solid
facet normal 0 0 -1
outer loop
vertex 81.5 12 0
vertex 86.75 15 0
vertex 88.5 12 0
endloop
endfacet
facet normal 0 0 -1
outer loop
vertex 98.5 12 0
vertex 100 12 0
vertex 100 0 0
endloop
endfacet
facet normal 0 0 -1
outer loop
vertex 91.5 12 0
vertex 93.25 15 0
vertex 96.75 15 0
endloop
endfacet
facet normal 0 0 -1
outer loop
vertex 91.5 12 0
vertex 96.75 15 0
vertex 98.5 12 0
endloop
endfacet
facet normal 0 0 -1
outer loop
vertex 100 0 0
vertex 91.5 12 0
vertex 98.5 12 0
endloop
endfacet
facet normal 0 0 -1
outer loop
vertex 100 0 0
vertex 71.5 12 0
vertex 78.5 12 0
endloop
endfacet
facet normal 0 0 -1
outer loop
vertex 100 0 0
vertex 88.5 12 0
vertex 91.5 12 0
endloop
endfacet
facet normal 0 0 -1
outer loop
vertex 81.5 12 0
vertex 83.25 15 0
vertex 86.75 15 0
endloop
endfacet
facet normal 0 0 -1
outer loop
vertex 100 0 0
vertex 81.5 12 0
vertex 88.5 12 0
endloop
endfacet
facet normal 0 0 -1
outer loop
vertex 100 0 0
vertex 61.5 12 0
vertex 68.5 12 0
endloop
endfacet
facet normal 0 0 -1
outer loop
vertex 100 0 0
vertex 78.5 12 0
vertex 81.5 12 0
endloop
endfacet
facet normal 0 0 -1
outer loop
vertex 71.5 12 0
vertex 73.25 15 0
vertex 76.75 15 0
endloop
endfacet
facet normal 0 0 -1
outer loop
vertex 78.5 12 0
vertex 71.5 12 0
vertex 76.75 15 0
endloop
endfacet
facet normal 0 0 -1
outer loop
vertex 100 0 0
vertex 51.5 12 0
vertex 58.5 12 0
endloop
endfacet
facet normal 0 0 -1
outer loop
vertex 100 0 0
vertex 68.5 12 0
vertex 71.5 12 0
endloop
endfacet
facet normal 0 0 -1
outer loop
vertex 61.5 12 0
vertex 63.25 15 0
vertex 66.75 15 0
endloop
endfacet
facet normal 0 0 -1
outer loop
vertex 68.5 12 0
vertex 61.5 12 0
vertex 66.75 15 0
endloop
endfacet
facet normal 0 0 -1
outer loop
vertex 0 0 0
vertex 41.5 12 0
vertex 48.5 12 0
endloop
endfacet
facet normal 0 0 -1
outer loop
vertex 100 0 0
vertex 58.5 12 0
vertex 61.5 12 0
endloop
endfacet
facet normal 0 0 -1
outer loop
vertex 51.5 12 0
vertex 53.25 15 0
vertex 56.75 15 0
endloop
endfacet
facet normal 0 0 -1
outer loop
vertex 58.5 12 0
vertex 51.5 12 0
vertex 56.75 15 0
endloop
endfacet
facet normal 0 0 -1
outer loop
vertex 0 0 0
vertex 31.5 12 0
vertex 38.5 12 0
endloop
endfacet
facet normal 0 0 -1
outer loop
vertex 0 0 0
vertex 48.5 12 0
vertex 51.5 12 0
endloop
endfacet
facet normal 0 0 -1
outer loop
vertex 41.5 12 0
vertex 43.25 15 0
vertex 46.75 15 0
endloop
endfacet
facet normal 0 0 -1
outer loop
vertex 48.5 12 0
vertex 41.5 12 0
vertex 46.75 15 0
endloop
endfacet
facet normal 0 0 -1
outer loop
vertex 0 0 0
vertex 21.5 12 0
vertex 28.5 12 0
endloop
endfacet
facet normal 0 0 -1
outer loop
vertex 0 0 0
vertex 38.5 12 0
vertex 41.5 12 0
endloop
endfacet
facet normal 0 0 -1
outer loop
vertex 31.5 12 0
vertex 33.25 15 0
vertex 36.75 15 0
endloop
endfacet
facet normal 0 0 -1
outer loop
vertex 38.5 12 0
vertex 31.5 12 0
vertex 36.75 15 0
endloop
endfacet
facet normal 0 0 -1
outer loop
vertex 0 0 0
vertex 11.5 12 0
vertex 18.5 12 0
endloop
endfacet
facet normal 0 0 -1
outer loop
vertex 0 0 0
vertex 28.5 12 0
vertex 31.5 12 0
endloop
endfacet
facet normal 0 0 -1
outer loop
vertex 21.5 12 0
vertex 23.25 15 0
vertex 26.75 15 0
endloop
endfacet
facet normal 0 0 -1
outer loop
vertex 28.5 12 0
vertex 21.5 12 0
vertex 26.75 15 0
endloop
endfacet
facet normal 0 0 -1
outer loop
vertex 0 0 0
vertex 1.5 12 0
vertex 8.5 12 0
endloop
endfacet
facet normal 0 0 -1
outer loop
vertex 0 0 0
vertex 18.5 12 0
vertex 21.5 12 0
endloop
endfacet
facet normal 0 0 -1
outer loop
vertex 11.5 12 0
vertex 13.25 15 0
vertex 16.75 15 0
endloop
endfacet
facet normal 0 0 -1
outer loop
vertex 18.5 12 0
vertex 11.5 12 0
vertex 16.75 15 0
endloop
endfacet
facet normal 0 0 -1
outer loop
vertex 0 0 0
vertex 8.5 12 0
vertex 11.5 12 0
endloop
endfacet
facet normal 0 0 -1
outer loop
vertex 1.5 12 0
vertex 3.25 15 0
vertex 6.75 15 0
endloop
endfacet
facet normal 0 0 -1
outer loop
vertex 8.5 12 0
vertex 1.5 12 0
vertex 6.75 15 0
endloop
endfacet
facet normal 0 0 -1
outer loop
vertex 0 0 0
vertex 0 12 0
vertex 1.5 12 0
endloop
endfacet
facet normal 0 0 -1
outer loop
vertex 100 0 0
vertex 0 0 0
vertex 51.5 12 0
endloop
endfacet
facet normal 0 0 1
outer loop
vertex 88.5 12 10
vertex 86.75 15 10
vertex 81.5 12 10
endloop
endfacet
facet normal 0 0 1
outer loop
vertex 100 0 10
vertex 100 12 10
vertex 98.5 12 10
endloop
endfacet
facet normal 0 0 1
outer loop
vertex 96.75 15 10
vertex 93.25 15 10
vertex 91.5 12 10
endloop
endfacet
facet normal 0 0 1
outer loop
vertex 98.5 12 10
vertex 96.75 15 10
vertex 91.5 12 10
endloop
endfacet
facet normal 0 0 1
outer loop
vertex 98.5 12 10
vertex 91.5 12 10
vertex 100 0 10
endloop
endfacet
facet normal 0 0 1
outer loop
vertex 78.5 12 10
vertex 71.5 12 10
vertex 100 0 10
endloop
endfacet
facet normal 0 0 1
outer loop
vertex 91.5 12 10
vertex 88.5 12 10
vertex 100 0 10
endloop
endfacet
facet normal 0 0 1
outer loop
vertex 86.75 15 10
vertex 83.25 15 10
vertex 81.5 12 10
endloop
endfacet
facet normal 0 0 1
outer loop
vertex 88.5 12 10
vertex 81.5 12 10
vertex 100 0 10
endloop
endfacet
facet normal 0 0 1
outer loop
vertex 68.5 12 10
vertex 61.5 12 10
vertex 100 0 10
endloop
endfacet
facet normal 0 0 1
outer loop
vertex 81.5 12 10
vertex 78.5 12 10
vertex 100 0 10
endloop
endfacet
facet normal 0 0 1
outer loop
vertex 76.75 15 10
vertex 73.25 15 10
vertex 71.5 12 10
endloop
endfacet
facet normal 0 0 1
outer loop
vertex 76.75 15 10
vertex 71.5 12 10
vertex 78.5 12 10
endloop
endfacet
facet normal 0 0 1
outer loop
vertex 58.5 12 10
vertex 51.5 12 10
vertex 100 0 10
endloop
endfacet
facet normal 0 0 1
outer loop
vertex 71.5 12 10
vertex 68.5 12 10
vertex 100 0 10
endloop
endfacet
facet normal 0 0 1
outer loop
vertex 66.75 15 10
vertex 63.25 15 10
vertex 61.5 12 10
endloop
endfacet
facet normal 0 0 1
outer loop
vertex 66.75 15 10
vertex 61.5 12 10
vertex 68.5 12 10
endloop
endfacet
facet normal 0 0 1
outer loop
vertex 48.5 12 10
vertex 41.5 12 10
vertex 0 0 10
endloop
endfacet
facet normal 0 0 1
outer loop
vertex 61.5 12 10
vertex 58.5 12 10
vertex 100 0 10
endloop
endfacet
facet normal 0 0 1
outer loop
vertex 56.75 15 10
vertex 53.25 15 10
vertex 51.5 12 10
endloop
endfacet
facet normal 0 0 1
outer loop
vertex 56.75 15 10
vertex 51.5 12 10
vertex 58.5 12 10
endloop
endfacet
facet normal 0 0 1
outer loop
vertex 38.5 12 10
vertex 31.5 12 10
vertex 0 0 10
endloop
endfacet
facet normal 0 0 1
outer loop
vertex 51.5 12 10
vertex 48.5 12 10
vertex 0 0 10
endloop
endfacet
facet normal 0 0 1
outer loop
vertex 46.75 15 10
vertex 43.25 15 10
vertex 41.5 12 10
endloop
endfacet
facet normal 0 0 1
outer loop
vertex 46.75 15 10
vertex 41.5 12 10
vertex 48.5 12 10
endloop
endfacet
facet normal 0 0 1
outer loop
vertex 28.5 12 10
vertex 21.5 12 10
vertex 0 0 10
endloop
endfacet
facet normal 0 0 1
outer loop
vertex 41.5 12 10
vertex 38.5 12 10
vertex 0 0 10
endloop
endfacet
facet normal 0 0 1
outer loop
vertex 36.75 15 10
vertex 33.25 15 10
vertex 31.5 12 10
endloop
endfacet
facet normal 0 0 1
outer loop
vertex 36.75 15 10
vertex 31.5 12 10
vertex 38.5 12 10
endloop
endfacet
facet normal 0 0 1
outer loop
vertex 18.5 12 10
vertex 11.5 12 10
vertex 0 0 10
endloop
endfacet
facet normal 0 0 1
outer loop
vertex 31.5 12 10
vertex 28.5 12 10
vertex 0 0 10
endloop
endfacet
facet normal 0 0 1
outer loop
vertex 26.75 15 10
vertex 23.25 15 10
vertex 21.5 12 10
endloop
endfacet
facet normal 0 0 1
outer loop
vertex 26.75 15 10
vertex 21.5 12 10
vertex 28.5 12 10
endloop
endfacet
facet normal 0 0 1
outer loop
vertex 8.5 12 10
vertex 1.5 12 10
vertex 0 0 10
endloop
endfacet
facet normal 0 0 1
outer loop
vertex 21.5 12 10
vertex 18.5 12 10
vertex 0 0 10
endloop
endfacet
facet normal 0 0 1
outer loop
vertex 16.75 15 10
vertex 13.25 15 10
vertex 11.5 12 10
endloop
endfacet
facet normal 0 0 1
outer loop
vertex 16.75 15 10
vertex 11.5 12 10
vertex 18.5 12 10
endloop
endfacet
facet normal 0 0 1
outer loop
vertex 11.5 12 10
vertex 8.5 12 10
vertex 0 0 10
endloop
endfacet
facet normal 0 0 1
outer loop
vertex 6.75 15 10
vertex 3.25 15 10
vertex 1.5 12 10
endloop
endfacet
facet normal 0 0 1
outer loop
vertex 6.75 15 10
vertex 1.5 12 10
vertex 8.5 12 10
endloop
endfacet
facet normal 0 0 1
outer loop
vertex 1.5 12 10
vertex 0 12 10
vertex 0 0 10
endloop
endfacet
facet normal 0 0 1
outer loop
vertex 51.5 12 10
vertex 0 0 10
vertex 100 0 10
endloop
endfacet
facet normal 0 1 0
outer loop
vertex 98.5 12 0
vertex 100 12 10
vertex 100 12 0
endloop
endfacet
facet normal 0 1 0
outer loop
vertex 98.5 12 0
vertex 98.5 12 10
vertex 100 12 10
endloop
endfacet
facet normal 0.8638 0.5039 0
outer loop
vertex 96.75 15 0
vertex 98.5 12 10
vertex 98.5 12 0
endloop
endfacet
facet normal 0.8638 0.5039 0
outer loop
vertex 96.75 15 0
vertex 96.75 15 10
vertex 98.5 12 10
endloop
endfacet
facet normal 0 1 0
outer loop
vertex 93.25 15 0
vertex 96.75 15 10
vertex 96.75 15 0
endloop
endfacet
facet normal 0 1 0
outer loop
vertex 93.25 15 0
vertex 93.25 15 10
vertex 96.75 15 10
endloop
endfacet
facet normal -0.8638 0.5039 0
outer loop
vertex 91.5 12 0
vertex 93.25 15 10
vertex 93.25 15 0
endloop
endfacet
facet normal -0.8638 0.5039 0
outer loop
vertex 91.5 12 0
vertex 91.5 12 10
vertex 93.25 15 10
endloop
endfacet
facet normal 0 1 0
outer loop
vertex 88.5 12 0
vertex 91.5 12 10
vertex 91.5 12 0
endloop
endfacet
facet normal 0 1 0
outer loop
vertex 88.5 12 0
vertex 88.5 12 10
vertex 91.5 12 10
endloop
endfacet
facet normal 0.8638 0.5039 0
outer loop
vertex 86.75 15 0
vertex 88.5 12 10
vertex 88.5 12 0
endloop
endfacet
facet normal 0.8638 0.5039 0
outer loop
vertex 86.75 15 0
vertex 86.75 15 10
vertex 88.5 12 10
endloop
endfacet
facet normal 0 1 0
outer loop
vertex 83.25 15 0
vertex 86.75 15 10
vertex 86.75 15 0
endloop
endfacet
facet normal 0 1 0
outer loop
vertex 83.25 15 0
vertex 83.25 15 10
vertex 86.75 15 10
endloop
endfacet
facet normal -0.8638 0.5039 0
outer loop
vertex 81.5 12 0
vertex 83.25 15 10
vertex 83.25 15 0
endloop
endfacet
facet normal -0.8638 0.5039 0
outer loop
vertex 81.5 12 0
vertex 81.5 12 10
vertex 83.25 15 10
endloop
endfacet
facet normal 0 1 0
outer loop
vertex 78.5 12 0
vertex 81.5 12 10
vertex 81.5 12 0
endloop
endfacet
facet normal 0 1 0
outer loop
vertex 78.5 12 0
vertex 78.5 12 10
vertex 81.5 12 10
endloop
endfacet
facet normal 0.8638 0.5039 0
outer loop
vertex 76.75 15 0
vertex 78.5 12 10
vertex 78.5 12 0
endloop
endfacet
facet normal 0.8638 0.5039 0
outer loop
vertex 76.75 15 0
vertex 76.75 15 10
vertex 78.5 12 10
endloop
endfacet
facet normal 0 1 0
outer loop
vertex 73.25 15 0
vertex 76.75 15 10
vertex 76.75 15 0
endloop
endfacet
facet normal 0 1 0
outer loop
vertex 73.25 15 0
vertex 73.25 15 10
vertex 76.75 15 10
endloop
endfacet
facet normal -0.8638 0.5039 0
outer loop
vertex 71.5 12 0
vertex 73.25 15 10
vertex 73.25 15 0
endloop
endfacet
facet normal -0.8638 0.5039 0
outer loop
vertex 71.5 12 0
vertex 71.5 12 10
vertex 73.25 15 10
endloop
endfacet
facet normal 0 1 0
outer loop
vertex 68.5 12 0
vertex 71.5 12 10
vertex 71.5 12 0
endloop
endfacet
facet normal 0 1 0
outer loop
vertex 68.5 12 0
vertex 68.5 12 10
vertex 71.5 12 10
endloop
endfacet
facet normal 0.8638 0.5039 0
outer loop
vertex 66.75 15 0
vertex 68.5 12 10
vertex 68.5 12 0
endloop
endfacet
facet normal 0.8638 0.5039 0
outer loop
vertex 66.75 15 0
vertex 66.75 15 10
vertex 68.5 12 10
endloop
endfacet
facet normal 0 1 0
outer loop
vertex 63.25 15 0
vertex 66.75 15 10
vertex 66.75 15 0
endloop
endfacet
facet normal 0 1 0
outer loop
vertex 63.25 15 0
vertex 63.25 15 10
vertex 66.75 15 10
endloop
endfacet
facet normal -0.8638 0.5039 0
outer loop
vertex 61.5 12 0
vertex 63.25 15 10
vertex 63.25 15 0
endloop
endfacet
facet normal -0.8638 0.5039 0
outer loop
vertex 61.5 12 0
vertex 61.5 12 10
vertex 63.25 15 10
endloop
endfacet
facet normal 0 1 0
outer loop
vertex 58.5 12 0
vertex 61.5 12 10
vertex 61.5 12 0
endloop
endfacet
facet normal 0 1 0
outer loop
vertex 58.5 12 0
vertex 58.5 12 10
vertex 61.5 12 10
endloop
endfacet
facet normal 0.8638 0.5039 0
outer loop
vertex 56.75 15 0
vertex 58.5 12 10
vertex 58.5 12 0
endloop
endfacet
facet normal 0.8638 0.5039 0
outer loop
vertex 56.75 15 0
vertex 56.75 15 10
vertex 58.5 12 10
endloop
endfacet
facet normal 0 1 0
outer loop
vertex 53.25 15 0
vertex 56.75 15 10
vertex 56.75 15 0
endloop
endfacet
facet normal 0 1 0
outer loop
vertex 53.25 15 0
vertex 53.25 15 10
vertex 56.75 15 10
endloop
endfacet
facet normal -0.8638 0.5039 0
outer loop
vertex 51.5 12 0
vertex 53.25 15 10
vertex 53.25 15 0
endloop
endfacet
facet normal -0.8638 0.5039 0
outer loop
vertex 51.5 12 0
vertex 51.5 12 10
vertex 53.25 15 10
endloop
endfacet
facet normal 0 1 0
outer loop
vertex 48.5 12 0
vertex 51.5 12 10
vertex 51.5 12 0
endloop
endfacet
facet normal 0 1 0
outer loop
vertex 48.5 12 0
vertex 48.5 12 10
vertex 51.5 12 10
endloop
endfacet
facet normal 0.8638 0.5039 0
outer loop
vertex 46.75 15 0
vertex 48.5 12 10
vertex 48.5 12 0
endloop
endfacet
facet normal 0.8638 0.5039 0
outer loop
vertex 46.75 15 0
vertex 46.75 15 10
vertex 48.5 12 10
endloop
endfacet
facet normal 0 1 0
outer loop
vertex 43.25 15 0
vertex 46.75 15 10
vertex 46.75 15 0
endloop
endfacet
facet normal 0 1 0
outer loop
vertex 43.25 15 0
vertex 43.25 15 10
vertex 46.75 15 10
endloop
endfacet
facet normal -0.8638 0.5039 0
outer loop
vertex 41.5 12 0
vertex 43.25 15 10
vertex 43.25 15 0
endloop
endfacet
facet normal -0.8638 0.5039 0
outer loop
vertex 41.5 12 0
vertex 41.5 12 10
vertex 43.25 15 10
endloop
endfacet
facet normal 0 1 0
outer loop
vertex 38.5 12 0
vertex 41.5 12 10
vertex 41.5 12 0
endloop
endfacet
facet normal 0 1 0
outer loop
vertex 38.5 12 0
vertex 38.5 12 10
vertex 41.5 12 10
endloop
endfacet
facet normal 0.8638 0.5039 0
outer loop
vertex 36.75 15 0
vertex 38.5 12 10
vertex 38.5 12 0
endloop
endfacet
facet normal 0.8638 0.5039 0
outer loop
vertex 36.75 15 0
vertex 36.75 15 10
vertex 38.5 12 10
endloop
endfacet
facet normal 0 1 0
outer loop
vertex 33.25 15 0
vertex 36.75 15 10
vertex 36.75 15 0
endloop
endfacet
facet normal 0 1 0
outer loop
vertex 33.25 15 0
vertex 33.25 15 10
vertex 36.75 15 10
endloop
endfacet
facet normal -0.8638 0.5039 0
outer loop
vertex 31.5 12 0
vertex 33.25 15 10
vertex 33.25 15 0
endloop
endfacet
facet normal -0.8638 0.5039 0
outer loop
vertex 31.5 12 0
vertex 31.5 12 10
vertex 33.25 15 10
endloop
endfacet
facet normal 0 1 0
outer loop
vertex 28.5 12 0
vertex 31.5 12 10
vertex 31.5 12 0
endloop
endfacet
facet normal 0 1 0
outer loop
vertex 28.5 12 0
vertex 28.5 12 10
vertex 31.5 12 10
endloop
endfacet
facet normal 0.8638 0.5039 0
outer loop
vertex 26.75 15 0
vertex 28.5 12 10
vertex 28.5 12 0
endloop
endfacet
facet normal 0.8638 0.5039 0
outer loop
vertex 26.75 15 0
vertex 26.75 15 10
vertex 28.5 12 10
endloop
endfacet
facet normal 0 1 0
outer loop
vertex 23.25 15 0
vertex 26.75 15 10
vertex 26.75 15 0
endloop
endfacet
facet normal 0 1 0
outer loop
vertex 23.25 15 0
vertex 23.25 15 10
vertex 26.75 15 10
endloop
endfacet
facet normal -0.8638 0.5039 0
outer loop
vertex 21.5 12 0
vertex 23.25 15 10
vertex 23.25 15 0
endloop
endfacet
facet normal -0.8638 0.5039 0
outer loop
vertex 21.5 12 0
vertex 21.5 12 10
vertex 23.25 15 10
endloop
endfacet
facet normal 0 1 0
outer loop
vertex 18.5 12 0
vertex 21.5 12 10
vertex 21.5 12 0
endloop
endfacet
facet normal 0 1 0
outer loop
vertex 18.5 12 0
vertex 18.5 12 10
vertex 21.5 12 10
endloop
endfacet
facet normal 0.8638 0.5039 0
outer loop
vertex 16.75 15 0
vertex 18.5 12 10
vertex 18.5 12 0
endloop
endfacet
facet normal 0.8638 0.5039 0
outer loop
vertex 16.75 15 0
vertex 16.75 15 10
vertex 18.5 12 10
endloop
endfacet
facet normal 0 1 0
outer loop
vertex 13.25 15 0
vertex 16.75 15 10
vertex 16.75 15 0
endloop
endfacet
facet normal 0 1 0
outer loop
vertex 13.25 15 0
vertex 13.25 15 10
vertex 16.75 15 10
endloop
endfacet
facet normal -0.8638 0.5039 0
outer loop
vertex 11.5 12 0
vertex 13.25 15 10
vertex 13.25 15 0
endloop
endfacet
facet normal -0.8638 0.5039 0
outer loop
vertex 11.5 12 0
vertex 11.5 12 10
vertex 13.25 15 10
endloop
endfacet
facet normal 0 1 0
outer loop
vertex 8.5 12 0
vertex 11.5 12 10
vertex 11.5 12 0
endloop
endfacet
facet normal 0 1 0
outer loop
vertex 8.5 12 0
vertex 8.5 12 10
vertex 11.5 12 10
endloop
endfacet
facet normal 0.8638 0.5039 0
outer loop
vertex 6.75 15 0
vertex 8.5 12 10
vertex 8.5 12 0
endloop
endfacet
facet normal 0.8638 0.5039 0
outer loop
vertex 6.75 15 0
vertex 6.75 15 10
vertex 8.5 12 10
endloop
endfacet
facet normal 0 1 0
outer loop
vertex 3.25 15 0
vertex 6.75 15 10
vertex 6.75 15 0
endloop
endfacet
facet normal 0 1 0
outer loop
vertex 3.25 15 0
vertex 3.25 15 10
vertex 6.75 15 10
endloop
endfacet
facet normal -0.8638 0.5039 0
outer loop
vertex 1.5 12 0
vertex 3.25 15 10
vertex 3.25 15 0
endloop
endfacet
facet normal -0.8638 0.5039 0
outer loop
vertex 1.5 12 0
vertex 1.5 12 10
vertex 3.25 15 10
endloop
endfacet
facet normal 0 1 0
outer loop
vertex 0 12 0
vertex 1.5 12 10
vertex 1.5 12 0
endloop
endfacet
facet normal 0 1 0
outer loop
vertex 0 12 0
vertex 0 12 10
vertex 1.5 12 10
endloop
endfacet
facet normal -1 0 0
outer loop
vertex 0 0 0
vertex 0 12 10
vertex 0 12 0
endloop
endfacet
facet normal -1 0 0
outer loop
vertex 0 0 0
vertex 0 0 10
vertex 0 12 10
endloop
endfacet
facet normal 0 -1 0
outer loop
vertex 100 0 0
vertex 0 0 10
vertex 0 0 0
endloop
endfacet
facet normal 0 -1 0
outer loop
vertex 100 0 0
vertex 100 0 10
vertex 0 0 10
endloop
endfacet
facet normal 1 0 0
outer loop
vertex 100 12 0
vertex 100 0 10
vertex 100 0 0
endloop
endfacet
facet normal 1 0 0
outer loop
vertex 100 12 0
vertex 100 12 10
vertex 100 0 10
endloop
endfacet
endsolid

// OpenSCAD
$fn = 32;

// ----------------------------------------------------------------------
// Gear rack: 10 teeth, pitch 10 mm
// ----------------------------------------------------------------------

// --- parameters (mm) ---
teeth = 10;               // number of teeth
pitch = 10;               // tooth pitch, X
root_w = 7;               // tooth width at the root
tip_w = 3.5;              // tooth width at the tip
base_h = 12;              // rack body height, Y
tooth_h = 3;              // tooth height above the body
plate_t = 10;             // rack width, Z (extrusion height)

rack_l = teeth * pitch;  // overall length
total_h = base_h + tooth_h;  // overall height

profile = [[0, 0], [100, 0], [100, 12], [98.5, 12], [96.75, 15], [93.25, 15], [91.5, 12], [88.5, 12], [86.75, 15], [83.25, 15], [81.5, 12], [78.5, 12], [76.75, 15], [73.25, 15], [71.5, 12], [68.5, 12], [66.75, 15], [63.25, 15], [61.5, 12], [58.5, 12], [56.75, 15], [53.25, 15], [51.5, 12], [48.5, 12], [46.75, 15], [43.25, 15], [41.5, 12], [38.5, 12], [36.75, 15], [33.25, 15], [31.5, 12], [28.5, 12], [26.75, 15], [23.25, 15], [21.5, 12], [18.5, 12], [16.75, 15], [13.25, 15], [11.5, 12], [8.5, 12], [6.75, 15], [3.25, 15], [1.5, 12], [0, 12]];  // primary outline, 44 points, counter clockwise

// --- the one profile operation ---
linear_extrude(height = plate_t) polygon(points = profile);
